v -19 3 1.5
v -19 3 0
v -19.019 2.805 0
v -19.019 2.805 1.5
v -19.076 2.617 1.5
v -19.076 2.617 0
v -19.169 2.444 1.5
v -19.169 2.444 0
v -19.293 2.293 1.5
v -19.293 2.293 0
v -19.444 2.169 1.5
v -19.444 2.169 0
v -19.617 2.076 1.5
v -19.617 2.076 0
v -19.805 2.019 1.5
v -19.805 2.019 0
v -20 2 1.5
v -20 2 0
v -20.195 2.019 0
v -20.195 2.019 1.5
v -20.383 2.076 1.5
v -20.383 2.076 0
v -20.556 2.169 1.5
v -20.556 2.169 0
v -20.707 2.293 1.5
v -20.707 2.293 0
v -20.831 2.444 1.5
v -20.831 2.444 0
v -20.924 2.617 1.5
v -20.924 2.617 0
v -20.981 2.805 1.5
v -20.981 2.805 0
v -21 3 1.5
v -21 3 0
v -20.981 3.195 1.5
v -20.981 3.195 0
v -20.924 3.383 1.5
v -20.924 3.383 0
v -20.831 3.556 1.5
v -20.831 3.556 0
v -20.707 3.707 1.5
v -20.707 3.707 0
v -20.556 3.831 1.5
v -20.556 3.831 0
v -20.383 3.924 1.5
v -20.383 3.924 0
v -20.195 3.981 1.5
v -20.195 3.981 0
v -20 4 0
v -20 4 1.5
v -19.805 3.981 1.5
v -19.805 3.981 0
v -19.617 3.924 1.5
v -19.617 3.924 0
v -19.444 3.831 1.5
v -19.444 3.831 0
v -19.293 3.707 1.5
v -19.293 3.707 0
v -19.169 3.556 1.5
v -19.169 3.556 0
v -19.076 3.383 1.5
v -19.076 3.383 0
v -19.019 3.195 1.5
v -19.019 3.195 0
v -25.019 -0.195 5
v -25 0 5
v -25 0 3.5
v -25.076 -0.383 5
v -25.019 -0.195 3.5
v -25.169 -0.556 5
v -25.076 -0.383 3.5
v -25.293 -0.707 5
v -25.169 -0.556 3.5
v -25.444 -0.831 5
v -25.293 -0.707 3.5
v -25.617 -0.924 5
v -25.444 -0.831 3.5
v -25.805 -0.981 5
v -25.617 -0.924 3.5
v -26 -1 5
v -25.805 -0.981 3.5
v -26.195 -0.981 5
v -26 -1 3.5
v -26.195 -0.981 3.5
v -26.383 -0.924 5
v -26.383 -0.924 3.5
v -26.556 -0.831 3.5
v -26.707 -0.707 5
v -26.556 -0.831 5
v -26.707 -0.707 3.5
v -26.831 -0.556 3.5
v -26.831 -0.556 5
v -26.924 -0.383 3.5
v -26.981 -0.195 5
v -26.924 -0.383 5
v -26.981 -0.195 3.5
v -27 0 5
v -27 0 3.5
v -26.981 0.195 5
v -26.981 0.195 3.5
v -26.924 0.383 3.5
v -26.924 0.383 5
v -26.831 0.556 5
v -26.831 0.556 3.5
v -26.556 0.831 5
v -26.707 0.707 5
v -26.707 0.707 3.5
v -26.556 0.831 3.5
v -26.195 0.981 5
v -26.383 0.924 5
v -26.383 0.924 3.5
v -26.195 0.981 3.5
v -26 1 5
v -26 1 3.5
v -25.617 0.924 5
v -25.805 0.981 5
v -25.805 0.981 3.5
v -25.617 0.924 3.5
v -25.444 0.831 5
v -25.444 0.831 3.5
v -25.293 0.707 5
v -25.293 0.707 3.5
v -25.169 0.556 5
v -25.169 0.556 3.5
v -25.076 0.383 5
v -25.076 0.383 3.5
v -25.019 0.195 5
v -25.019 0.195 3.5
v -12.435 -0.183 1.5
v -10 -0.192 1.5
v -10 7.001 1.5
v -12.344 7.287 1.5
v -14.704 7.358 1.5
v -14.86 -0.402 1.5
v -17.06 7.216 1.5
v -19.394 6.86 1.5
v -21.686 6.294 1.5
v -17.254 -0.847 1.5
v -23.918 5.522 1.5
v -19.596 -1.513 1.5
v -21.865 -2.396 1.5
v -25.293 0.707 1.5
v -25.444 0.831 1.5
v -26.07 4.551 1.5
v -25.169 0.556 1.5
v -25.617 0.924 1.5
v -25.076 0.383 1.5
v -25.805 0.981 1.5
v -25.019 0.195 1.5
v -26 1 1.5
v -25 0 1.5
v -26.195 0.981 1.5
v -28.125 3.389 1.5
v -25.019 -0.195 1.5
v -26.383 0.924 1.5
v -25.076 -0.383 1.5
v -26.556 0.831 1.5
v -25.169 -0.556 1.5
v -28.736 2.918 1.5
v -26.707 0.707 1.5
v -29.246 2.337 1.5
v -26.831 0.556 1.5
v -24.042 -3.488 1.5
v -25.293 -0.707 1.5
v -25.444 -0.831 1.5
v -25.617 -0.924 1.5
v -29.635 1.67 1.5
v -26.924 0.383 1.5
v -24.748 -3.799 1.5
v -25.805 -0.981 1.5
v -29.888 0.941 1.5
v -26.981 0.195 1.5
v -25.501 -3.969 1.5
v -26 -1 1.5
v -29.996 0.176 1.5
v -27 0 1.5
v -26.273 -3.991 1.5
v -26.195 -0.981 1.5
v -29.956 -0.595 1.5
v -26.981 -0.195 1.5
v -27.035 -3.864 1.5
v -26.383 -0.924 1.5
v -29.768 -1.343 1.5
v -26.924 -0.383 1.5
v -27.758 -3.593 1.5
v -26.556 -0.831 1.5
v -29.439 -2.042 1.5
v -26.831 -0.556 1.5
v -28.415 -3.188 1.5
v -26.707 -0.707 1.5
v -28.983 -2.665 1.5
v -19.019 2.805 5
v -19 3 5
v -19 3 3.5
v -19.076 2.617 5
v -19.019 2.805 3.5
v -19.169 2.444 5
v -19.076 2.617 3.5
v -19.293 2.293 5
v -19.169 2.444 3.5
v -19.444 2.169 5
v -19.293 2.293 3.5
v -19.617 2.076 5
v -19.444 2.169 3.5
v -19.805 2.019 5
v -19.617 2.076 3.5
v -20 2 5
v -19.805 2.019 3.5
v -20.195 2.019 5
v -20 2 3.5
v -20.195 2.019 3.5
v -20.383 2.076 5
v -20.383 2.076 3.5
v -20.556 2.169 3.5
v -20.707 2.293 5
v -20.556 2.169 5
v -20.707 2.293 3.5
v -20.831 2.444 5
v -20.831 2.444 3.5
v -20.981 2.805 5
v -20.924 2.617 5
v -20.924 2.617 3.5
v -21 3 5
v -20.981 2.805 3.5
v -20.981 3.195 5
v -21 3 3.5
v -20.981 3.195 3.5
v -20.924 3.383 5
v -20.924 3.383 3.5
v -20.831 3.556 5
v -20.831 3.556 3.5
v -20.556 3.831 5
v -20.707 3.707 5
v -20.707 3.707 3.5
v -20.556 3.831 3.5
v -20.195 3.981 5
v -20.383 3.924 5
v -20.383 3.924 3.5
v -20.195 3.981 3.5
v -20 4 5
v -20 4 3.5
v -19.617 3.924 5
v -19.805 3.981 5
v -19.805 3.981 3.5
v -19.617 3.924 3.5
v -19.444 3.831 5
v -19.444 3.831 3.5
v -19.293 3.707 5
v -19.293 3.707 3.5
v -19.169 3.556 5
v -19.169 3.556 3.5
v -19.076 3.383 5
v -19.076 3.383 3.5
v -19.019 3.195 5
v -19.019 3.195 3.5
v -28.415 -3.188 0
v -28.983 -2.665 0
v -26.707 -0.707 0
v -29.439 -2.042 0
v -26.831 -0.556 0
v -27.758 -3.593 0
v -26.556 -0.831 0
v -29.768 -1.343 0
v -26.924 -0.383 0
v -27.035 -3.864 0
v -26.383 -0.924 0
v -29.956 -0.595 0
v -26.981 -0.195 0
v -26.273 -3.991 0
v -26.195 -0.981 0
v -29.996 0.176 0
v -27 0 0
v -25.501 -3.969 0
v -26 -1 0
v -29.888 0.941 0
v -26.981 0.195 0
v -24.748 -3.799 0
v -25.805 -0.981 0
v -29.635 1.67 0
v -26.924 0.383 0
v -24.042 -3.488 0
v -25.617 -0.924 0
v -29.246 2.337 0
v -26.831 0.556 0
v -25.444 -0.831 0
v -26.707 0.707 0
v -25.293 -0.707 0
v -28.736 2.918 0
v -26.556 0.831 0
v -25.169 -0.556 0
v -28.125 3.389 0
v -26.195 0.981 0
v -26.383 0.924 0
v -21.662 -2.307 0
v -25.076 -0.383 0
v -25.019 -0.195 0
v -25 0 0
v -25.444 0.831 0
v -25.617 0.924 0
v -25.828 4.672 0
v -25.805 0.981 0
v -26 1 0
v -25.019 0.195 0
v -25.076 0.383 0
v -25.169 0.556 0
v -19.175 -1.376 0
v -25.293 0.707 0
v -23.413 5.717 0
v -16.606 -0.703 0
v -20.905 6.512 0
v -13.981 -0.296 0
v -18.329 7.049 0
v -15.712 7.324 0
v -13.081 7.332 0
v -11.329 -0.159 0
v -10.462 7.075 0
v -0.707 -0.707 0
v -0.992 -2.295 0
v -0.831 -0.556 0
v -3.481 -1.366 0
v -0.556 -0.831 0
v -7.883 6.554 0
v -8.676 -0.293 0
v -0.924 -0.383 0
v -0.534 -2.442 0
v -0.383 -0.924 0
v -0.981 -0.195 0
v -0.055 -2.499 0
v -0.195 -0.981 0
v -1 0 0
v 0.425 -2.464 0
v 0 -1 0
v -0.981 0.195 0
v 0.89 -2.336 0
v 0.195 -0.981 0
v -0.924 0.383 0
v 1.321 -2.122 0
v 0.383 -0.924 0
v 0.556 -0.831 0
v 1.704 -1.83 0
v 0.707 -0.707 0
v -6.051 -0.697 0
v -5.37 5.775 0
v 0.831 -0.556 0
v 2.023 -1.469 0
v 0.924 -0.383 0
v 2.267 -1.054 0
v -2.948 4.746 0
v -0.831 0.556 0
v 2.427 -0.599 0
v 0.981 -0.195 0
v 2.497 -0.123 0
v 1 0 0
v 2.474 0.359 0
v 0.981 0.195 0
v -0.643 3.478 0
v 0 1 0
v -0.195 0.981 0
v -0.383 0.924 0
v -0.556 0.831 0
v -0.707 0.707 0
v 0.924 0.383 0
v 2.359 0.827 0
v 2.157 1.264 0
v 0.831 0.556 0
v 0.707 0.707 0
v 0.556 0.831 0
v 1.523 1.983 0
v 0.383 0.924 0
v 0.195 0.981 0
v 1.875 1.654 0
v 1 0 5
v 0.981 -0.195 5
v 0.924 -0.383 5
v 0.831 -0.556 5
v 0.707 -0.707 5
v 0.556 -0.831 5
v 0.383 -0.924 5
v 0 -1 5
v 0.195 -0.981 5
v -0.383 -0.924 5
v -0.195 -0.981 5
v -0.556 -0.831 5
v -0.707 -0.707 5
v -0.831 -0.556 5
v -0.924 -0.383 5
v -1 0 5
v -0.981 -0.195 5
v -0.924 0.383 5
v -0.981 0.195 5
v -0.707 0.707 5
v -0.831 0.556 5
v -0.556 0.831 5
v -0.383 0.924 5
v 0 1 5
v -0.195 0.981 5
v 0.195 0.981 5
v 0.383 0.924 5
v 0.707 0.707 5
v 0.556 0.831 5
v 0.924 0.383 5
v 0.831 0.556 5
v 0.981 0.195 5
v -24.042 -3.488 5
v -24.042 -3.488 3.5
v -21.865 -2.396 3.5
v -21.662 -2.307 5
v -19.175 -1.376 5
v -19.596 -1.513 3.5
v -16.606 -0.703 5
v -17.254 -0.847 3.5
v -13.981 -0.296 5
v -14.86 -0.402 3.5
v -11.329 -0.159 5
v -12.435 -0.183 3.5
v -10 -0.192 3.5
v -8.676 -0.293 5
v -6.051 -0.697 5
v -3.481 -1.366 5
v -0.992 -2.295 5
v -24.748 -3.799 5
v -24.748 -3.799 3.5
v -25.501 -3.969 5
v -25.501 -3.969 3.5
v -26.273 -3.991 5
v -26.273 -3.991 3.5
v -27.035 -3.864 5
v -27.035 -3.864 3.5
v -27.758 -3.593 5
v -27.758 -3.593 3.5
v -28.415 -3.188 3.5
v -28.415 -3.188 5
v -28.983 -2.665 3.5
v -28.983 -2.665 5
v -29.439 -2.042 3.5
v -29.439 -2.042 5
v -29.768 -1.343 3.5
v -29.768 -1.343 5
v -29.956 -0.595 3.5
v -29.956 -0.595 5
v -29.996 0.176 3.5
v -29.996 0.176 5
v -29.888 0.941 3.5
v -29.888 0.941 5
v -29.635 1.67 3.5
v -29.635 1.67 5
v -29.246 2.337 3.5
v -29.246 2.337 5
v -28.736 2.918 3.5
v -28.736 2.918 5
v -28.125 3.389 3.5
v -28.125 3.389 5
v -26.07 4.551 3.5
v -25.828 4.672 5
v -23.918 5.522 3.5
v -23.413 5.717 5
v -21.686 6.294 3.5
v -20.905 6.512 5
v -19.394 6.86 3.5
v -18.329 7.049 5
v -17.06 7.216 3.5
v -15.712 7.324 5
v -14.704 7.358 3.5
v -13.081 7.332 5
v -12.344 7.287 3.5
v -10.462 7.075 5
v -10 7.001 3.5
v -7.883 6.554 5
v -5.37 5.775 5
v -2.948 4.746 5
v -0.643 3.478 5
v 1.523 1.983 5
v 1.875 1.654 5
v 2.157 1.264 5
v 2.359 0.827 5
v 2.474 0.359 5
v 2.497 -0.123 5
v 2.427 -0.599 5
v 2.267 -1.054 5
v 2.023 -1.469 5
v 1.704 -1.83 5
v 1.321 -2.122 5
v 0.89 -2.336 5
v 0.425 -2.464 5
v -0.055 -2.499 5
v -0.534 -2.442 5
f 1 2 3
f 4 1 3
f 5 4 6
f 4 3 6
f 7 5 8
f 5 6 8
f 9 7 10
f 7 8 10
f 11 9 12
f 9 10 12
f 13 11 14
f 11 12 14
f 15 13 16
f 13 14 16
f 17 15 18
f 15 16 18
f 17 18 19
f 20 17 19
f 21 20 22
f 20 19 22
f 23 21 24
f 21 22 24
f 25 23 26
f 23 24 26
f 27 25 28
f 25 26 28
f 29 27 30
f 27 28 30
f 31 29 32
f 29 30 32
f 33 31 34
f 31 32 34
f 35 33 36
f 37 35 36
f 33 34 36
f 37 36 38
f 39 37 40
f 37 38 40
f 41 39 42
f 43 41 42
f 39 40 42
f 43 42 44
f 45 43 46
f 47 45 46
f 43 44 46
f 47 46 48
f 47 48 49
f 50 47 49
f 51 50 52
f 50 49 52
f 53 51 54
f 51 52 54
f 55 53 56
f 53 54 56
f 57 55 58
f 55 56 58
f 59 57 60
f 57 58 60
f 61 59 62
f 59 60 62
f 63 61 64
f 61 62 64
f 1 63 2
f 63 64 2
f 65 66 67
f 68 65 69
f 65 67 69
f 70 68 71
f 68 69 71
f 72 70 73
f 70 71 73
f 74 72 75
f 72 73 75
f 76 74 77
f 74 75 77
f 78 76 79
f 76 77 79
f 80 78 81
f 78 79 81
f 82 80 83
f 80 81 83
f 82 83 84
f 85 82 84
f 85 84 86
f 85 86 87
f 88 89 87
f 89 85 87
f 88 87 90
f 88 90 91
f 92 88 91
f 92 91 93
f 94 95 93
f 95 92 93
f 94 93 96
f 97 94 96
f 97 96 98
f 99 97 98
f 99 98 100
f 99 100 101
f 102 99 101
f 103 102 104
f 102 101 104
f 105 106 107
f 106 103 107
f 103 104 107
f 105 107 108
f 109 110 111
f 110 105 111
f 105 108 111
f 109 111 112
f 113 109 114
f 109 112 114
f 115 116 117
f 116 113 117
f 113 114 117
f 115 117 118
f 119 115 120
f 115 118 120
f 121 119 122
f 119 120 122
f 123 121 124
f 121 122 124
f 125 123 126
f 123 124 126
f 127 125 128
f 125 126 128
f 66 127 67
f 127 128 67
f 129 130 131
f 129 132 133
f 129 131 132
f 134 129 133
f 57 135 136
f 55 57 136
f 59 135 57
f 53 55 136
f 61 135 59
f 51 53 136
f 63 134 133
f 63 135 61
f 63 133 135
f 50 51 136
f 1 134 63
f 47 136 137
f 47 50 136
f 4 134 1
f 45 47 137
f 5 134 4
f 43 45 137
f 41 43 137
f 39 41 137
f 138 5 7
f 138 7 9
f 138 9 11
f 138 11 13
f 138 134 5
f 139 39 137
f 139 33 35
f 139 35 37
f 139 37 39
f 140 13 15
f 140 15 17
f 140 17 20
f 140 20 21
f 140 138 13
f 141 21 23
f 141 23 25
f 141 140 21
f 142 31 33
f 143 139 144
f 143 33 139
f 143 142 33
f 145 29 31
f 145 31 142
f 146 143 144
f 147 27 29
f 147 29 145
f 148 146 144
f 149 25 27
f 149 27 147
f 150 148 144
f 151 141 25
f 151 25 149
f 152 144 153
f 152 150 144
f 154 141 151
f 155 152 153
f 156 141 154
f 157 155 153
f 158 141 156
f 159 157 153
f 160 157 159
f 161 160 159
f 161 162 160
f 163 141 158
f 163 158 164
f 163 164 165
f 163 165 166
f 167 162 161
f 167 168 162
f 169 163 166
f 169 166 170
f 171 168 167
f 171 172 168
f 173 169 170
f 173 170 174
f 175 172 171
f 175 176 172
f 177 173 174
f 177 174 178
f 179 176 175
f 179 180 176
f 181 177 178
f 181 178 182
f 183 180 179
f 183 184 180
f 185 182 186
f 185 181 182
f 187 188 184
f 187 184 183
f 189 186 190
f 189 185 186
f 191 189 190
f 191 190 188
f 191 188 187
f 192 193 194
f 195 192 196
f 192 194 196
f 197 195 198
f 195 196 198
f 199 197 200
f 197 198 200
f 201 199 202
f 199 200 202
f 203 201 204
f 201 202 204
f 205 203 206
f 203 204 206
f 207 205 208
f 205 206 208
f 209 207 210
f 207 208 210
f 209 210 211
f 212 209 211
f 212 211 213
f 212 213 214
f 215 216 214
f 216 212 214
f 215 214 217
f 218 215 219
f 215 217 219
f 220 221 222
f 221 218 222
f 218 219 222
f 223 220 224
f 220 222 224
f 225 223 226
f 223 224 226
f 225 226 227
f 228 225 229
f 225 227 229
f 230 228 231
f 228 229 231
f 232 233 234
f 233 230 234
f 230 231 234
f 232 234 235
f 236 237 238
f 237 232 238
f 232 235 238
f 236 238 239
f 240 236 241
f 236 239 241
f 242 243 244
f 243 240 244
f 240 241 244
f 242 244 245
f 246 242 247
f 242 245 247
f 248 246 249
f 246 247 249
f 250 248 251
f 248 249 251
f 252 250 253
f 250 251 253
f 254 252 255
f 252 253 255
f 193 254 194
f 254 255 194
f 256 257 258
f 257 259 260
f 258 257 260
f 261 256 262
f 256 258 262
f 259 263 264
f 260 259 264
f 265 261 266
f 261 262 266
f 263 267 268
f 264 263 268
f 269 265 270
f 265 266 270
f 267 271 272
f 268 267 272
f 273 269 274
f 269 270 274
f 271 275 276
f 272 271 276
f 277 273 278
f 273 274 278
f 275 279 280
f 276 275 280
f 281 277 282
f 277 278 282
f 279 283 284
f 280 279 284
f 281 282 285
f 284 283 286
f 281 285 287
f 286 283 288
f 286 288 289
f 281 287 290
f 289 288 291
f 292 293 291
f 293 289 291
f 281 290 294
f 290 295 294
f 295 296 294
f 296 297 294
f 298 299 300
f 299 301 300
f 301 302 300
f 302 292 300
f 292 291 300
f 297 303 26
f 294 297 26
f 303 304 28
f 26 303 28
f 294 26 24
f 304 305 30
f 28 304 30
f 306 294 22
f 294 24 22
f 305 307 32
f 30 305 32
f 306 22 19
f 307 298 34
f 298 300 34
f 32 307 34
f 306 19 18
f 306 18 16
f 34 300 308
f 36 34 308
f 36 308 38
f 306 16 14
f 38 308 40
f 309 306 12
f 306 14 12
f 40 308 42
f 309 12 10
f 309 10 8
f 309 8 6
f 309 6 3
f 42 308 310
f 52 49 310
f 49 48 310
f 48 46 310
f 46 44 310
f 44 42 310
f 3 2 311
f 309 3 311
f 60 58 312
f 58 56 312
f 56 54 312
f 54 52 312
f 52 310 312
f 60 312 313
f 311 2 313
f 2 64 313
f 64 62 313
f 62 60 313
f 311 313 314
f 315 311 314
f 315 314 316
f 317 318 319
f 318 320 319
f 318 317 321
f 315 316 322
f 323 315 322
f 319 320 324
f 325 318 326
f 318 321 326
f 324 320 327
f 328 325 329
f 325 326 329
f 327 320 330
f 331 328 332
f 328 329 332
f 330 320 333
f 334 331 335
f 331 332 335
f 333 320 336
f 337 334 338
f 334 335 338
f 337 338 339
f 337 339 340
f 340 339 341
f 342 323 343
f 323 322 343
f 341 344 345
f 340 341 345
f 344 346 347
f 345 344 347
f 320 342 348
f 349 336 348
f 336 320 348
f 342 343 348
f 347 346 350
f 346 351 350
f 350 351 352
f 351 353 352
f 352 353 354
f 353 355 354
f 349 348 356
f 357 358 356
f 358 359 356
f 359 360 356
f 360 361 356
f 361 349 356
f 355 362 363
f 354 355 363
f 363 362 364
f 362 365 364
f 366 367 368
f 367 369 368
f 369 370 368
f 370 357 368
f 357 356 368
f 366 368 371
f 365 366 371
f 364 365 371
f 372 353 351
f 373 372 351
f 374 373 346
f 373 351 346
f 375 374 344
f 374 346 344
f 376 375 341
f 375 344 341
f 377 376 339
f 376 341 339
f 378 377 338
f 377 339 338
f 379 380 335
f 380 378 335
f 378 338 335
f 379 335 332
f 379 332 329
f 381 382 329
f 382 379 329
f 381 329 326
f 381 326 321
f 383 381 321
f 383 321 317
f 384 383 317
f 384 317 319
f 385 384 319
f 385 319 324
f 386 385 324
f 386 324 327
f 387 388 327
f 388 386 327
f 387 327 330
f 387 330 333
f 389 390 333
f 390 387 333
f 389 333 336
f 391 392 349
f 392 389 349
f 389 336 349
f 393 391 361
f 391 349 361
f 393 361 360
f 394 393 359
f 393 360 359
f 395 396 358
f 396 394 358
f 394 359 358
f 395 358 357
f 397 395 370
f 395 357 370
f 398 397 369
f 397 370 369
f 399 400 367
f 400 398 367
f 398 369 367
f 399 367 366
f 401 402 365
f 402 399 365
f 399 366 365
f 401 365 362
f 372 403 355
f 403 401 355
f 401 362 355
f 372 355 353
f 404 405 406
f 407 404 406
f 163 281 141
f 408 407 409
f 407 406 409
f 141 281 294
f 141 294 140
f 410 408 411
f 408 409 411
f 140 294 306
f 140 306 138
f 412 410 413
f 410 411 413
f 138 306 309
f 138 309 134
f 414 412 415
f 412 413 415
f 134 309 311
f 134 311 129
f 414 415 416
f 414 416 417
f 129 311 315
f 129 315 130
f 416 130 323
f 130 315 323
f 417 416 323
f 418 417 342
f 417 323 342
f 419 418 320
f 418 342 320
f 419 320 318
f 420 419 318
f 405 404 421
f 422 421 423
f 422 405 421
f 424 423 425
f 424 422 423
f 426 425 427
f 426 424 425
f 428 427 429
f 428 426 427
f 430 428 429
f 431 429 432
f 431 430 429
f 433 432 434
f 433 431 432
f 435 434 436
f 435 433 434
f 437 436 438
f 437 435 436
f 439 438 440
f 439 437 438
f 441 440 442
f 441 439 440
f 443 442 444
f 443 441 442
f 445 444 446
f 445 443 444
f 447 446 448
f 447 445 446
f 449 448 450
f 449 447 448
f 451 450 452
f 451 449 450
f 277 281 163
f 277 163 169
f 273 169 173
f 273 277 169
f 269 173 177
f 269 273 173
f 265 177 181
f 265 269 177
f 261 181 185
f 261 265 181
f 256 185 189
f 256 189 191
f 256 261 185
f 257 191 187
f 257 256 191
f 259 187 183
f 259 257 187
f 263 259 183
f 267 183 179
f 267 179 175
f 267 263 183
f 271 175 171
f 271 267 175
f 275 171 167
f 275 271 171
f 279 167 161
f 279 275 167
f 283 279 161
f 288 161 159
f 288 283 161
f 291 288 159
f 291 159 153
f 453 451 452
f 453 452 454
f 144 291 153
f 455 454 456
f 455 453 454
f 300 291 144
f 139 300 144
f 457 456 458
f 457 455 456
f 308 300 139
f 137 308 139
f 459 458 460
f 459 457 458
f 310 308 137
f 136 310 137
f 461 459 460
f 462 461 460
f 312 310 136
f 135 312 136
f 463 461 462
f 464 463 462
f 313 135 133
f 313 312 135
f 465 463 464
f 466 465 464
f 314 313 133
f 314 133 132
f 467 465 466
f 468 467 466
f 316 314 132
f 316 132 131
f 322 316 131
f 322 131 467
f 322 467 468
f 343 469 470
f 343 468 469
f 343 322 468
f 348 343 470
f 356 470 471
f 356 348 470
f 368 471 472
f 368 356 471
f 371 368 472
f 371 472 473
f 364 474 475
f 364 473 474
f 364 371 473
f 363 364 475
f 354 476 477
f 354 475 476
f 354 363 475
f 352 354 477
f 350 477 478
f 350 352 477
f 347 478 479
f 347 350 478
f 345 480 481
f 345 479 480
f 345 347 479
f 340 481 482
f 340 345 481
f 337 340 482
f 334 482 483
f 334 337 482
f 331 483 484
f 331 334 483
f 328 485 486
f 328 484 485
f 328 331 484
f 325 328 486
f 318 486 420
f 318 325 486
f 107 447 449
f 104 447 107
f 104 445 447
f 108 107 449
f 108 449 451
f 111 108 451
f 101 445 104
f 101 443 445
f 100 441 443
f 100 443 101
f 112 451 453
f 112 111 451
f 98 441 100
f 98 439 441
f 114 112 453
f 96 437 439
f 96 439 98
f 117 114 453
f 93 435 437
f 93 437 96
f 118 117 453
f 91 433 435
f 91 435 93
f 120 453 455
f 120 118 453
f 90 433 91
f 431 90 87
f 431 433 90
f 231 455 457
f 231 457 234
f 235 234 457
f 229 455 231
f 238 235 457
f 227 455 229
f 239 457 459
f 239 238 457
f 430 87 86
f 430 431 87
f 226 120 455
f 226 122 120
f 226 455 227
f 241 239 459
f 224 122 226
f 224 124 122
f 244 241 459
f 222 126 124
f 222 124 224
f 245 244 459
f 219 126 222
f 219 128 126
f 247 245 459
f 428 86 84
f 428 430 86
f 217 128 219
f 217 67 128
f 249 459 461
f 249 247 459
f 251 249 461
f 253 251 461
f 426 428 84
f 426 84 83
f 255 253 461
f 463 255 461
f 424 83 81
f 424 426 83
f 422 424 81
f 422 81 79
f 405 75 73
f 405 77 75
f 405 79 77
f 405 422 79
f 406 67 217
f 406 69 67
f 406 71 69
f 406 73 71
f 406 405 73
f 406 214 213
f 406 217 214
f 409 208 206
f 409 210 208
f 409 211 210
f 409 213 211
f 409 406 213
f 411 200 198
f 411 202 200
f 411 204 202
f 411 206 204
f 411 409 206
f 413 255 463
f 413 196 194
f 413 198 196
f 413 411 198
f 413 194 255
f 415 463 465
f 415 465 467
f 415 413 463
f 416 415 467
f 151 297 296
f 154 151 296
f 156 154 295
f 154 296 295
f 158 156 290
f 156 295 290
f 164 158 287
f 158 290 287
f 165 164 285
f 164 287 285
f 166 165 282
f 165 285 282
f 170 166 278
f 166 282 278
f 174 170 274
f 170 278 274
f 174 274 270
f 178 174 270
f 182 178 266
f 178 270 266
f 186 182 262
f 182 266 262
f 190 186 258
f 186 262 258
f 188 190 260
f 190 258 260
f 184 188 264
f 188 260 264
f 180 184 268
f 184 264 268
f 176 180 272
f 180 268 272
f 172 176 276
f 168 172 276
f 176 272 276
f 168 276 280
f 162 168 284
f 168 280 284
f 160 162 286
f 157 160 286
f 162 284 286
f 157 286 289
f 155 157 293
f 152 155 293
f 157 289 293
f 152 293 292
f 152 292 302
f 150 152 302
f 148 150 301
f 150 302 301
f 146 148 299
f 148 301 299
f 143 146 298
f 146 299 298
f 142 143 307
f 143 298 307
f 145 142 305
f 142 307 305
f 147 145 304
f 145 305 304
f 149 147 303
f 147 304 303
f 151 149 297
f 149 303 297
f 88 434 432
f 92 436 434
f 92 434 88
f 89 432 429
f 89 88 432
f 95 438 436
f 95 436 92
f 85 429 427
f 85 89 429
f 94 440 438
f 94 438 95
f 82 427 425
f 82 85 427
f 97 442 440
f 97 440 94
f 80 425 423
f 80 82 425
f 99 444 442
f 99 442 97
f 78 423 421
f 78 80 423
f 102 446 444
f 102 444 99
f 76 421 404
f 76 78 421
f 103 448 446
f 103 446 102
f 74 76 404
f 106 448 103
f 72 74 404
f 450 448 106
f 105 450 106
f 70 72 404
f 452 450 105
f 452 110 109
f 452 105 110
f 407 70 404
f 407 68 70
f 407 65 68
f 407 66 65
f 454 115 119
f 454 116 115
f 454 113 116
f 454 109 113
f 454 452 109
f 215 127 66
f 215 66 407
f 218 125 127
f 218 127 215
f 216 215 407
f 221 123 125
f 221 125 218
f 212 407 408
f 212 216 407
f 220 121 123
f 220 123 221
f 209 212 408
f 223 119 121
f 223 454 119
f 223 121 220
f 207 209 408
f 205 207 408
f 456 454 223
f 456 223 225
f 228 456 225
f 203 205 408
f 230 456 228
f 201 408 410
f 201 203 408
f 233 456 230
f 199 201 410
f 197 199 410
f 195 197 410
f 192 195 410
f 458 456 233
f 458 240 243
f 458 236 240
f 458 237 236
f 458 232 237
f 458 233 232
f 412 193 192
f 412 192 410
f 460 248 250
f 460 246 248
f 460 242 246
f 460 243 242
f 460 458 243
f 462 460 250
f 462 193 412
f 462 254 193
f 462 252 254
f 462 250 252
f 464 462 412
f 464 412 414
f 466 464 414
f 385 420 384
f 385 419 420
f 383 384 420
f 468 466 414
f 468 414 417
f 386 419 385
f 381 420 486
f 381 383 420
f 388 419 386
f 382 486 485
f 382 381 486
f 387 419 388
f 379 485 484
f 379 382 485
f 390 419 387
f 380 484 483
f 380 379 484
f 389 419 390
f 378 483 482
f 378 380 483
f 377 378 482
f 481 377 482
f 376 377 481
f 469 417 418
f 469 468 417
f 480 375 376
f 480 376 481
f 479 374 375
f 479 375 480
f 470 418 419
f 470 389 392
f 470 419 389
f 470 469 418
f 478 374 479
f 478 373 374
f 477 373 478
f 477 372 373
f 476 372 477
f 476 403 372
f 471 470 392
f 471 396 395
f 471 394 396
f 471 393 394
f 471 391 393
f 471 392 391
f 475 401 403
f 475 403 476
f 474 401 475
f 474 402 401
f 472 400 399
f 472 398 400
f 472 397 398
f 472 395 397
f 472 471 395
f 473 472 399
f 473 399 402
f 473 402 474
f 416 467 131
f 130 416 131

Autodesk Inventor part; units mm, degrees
ref_plane "Work Plane1" through (0, 0, 0.75) normal (0, 0, 1) x (1, 0, 0)
ref_plane "YZ Plane" through (0, 0, 0) normal (1, 0, 0) x (0, 1, 0)
ref_plane "XZ Plane" through (0, 0, 0) normal (0, 1, 0) x (-1, 0, 0)
sketch "Sketch1" plane through (0, 0, 0) normal (0, 0, 1) x (1, 0, 0)
  circle A0 centre (0, 0) radius 1
  circle A1 centre (-20, 3) radius 1
  circle A2 centre (-26, 0) radius 1
  arc A3 (-0.9923, -2.2946) -> (1.5226, 1.9828) centre (0, 0) ccw
  arc A4 (-28.125, 3.3889) -> (-24.0417, -3.4878) centre (-26, 0) ccw
  arc A5 (1.5226, 1.9828) -> (-28.125, 3.3889) centre (-14.3125, -18.6387) ccw
  arc A6 (-0.9923, -2.2946) -> (-24.0417, -3.4878) centre (-11.3125, -26.1587) ccw
  dimension "d50" = 2
  dimension "d51" = 3
  dimension "d52" = 20
  dimension "d53" = 6
  dimension "d55" = 2.5
  dimension "d56" = 4
  dimension "d57" = 26
  dimension "d58" = 26
extrude "Extrusion1" add sketch "Sketch1" along normal blind 5
sketch "Sketch3" plane through (0, 0, 0) normal (0, 1, 0) x (-1, 0, 0)
  line L0 (10, 1.5) -> (45.3794, 1.5)
  line L1 (45.3794, 1.5) -> (45.3794, 3.5)
  line L2 (45.3794, 3.5) -> (10, 3.5)
  line L3 (10, 3.5) -> (10, 1.5)
  line L4 (-0.0755, 0) -> (-0.0755, 5) projected
  point P0 (0, 0)
  dimension "d34" = 1.5
  dimension "d35" = 10
  dimension "d36" = 2
extrude "Extrusion3" cut sketch "Sketch3" along normal through all both and the other way through all
properties part number "legA_mini"
